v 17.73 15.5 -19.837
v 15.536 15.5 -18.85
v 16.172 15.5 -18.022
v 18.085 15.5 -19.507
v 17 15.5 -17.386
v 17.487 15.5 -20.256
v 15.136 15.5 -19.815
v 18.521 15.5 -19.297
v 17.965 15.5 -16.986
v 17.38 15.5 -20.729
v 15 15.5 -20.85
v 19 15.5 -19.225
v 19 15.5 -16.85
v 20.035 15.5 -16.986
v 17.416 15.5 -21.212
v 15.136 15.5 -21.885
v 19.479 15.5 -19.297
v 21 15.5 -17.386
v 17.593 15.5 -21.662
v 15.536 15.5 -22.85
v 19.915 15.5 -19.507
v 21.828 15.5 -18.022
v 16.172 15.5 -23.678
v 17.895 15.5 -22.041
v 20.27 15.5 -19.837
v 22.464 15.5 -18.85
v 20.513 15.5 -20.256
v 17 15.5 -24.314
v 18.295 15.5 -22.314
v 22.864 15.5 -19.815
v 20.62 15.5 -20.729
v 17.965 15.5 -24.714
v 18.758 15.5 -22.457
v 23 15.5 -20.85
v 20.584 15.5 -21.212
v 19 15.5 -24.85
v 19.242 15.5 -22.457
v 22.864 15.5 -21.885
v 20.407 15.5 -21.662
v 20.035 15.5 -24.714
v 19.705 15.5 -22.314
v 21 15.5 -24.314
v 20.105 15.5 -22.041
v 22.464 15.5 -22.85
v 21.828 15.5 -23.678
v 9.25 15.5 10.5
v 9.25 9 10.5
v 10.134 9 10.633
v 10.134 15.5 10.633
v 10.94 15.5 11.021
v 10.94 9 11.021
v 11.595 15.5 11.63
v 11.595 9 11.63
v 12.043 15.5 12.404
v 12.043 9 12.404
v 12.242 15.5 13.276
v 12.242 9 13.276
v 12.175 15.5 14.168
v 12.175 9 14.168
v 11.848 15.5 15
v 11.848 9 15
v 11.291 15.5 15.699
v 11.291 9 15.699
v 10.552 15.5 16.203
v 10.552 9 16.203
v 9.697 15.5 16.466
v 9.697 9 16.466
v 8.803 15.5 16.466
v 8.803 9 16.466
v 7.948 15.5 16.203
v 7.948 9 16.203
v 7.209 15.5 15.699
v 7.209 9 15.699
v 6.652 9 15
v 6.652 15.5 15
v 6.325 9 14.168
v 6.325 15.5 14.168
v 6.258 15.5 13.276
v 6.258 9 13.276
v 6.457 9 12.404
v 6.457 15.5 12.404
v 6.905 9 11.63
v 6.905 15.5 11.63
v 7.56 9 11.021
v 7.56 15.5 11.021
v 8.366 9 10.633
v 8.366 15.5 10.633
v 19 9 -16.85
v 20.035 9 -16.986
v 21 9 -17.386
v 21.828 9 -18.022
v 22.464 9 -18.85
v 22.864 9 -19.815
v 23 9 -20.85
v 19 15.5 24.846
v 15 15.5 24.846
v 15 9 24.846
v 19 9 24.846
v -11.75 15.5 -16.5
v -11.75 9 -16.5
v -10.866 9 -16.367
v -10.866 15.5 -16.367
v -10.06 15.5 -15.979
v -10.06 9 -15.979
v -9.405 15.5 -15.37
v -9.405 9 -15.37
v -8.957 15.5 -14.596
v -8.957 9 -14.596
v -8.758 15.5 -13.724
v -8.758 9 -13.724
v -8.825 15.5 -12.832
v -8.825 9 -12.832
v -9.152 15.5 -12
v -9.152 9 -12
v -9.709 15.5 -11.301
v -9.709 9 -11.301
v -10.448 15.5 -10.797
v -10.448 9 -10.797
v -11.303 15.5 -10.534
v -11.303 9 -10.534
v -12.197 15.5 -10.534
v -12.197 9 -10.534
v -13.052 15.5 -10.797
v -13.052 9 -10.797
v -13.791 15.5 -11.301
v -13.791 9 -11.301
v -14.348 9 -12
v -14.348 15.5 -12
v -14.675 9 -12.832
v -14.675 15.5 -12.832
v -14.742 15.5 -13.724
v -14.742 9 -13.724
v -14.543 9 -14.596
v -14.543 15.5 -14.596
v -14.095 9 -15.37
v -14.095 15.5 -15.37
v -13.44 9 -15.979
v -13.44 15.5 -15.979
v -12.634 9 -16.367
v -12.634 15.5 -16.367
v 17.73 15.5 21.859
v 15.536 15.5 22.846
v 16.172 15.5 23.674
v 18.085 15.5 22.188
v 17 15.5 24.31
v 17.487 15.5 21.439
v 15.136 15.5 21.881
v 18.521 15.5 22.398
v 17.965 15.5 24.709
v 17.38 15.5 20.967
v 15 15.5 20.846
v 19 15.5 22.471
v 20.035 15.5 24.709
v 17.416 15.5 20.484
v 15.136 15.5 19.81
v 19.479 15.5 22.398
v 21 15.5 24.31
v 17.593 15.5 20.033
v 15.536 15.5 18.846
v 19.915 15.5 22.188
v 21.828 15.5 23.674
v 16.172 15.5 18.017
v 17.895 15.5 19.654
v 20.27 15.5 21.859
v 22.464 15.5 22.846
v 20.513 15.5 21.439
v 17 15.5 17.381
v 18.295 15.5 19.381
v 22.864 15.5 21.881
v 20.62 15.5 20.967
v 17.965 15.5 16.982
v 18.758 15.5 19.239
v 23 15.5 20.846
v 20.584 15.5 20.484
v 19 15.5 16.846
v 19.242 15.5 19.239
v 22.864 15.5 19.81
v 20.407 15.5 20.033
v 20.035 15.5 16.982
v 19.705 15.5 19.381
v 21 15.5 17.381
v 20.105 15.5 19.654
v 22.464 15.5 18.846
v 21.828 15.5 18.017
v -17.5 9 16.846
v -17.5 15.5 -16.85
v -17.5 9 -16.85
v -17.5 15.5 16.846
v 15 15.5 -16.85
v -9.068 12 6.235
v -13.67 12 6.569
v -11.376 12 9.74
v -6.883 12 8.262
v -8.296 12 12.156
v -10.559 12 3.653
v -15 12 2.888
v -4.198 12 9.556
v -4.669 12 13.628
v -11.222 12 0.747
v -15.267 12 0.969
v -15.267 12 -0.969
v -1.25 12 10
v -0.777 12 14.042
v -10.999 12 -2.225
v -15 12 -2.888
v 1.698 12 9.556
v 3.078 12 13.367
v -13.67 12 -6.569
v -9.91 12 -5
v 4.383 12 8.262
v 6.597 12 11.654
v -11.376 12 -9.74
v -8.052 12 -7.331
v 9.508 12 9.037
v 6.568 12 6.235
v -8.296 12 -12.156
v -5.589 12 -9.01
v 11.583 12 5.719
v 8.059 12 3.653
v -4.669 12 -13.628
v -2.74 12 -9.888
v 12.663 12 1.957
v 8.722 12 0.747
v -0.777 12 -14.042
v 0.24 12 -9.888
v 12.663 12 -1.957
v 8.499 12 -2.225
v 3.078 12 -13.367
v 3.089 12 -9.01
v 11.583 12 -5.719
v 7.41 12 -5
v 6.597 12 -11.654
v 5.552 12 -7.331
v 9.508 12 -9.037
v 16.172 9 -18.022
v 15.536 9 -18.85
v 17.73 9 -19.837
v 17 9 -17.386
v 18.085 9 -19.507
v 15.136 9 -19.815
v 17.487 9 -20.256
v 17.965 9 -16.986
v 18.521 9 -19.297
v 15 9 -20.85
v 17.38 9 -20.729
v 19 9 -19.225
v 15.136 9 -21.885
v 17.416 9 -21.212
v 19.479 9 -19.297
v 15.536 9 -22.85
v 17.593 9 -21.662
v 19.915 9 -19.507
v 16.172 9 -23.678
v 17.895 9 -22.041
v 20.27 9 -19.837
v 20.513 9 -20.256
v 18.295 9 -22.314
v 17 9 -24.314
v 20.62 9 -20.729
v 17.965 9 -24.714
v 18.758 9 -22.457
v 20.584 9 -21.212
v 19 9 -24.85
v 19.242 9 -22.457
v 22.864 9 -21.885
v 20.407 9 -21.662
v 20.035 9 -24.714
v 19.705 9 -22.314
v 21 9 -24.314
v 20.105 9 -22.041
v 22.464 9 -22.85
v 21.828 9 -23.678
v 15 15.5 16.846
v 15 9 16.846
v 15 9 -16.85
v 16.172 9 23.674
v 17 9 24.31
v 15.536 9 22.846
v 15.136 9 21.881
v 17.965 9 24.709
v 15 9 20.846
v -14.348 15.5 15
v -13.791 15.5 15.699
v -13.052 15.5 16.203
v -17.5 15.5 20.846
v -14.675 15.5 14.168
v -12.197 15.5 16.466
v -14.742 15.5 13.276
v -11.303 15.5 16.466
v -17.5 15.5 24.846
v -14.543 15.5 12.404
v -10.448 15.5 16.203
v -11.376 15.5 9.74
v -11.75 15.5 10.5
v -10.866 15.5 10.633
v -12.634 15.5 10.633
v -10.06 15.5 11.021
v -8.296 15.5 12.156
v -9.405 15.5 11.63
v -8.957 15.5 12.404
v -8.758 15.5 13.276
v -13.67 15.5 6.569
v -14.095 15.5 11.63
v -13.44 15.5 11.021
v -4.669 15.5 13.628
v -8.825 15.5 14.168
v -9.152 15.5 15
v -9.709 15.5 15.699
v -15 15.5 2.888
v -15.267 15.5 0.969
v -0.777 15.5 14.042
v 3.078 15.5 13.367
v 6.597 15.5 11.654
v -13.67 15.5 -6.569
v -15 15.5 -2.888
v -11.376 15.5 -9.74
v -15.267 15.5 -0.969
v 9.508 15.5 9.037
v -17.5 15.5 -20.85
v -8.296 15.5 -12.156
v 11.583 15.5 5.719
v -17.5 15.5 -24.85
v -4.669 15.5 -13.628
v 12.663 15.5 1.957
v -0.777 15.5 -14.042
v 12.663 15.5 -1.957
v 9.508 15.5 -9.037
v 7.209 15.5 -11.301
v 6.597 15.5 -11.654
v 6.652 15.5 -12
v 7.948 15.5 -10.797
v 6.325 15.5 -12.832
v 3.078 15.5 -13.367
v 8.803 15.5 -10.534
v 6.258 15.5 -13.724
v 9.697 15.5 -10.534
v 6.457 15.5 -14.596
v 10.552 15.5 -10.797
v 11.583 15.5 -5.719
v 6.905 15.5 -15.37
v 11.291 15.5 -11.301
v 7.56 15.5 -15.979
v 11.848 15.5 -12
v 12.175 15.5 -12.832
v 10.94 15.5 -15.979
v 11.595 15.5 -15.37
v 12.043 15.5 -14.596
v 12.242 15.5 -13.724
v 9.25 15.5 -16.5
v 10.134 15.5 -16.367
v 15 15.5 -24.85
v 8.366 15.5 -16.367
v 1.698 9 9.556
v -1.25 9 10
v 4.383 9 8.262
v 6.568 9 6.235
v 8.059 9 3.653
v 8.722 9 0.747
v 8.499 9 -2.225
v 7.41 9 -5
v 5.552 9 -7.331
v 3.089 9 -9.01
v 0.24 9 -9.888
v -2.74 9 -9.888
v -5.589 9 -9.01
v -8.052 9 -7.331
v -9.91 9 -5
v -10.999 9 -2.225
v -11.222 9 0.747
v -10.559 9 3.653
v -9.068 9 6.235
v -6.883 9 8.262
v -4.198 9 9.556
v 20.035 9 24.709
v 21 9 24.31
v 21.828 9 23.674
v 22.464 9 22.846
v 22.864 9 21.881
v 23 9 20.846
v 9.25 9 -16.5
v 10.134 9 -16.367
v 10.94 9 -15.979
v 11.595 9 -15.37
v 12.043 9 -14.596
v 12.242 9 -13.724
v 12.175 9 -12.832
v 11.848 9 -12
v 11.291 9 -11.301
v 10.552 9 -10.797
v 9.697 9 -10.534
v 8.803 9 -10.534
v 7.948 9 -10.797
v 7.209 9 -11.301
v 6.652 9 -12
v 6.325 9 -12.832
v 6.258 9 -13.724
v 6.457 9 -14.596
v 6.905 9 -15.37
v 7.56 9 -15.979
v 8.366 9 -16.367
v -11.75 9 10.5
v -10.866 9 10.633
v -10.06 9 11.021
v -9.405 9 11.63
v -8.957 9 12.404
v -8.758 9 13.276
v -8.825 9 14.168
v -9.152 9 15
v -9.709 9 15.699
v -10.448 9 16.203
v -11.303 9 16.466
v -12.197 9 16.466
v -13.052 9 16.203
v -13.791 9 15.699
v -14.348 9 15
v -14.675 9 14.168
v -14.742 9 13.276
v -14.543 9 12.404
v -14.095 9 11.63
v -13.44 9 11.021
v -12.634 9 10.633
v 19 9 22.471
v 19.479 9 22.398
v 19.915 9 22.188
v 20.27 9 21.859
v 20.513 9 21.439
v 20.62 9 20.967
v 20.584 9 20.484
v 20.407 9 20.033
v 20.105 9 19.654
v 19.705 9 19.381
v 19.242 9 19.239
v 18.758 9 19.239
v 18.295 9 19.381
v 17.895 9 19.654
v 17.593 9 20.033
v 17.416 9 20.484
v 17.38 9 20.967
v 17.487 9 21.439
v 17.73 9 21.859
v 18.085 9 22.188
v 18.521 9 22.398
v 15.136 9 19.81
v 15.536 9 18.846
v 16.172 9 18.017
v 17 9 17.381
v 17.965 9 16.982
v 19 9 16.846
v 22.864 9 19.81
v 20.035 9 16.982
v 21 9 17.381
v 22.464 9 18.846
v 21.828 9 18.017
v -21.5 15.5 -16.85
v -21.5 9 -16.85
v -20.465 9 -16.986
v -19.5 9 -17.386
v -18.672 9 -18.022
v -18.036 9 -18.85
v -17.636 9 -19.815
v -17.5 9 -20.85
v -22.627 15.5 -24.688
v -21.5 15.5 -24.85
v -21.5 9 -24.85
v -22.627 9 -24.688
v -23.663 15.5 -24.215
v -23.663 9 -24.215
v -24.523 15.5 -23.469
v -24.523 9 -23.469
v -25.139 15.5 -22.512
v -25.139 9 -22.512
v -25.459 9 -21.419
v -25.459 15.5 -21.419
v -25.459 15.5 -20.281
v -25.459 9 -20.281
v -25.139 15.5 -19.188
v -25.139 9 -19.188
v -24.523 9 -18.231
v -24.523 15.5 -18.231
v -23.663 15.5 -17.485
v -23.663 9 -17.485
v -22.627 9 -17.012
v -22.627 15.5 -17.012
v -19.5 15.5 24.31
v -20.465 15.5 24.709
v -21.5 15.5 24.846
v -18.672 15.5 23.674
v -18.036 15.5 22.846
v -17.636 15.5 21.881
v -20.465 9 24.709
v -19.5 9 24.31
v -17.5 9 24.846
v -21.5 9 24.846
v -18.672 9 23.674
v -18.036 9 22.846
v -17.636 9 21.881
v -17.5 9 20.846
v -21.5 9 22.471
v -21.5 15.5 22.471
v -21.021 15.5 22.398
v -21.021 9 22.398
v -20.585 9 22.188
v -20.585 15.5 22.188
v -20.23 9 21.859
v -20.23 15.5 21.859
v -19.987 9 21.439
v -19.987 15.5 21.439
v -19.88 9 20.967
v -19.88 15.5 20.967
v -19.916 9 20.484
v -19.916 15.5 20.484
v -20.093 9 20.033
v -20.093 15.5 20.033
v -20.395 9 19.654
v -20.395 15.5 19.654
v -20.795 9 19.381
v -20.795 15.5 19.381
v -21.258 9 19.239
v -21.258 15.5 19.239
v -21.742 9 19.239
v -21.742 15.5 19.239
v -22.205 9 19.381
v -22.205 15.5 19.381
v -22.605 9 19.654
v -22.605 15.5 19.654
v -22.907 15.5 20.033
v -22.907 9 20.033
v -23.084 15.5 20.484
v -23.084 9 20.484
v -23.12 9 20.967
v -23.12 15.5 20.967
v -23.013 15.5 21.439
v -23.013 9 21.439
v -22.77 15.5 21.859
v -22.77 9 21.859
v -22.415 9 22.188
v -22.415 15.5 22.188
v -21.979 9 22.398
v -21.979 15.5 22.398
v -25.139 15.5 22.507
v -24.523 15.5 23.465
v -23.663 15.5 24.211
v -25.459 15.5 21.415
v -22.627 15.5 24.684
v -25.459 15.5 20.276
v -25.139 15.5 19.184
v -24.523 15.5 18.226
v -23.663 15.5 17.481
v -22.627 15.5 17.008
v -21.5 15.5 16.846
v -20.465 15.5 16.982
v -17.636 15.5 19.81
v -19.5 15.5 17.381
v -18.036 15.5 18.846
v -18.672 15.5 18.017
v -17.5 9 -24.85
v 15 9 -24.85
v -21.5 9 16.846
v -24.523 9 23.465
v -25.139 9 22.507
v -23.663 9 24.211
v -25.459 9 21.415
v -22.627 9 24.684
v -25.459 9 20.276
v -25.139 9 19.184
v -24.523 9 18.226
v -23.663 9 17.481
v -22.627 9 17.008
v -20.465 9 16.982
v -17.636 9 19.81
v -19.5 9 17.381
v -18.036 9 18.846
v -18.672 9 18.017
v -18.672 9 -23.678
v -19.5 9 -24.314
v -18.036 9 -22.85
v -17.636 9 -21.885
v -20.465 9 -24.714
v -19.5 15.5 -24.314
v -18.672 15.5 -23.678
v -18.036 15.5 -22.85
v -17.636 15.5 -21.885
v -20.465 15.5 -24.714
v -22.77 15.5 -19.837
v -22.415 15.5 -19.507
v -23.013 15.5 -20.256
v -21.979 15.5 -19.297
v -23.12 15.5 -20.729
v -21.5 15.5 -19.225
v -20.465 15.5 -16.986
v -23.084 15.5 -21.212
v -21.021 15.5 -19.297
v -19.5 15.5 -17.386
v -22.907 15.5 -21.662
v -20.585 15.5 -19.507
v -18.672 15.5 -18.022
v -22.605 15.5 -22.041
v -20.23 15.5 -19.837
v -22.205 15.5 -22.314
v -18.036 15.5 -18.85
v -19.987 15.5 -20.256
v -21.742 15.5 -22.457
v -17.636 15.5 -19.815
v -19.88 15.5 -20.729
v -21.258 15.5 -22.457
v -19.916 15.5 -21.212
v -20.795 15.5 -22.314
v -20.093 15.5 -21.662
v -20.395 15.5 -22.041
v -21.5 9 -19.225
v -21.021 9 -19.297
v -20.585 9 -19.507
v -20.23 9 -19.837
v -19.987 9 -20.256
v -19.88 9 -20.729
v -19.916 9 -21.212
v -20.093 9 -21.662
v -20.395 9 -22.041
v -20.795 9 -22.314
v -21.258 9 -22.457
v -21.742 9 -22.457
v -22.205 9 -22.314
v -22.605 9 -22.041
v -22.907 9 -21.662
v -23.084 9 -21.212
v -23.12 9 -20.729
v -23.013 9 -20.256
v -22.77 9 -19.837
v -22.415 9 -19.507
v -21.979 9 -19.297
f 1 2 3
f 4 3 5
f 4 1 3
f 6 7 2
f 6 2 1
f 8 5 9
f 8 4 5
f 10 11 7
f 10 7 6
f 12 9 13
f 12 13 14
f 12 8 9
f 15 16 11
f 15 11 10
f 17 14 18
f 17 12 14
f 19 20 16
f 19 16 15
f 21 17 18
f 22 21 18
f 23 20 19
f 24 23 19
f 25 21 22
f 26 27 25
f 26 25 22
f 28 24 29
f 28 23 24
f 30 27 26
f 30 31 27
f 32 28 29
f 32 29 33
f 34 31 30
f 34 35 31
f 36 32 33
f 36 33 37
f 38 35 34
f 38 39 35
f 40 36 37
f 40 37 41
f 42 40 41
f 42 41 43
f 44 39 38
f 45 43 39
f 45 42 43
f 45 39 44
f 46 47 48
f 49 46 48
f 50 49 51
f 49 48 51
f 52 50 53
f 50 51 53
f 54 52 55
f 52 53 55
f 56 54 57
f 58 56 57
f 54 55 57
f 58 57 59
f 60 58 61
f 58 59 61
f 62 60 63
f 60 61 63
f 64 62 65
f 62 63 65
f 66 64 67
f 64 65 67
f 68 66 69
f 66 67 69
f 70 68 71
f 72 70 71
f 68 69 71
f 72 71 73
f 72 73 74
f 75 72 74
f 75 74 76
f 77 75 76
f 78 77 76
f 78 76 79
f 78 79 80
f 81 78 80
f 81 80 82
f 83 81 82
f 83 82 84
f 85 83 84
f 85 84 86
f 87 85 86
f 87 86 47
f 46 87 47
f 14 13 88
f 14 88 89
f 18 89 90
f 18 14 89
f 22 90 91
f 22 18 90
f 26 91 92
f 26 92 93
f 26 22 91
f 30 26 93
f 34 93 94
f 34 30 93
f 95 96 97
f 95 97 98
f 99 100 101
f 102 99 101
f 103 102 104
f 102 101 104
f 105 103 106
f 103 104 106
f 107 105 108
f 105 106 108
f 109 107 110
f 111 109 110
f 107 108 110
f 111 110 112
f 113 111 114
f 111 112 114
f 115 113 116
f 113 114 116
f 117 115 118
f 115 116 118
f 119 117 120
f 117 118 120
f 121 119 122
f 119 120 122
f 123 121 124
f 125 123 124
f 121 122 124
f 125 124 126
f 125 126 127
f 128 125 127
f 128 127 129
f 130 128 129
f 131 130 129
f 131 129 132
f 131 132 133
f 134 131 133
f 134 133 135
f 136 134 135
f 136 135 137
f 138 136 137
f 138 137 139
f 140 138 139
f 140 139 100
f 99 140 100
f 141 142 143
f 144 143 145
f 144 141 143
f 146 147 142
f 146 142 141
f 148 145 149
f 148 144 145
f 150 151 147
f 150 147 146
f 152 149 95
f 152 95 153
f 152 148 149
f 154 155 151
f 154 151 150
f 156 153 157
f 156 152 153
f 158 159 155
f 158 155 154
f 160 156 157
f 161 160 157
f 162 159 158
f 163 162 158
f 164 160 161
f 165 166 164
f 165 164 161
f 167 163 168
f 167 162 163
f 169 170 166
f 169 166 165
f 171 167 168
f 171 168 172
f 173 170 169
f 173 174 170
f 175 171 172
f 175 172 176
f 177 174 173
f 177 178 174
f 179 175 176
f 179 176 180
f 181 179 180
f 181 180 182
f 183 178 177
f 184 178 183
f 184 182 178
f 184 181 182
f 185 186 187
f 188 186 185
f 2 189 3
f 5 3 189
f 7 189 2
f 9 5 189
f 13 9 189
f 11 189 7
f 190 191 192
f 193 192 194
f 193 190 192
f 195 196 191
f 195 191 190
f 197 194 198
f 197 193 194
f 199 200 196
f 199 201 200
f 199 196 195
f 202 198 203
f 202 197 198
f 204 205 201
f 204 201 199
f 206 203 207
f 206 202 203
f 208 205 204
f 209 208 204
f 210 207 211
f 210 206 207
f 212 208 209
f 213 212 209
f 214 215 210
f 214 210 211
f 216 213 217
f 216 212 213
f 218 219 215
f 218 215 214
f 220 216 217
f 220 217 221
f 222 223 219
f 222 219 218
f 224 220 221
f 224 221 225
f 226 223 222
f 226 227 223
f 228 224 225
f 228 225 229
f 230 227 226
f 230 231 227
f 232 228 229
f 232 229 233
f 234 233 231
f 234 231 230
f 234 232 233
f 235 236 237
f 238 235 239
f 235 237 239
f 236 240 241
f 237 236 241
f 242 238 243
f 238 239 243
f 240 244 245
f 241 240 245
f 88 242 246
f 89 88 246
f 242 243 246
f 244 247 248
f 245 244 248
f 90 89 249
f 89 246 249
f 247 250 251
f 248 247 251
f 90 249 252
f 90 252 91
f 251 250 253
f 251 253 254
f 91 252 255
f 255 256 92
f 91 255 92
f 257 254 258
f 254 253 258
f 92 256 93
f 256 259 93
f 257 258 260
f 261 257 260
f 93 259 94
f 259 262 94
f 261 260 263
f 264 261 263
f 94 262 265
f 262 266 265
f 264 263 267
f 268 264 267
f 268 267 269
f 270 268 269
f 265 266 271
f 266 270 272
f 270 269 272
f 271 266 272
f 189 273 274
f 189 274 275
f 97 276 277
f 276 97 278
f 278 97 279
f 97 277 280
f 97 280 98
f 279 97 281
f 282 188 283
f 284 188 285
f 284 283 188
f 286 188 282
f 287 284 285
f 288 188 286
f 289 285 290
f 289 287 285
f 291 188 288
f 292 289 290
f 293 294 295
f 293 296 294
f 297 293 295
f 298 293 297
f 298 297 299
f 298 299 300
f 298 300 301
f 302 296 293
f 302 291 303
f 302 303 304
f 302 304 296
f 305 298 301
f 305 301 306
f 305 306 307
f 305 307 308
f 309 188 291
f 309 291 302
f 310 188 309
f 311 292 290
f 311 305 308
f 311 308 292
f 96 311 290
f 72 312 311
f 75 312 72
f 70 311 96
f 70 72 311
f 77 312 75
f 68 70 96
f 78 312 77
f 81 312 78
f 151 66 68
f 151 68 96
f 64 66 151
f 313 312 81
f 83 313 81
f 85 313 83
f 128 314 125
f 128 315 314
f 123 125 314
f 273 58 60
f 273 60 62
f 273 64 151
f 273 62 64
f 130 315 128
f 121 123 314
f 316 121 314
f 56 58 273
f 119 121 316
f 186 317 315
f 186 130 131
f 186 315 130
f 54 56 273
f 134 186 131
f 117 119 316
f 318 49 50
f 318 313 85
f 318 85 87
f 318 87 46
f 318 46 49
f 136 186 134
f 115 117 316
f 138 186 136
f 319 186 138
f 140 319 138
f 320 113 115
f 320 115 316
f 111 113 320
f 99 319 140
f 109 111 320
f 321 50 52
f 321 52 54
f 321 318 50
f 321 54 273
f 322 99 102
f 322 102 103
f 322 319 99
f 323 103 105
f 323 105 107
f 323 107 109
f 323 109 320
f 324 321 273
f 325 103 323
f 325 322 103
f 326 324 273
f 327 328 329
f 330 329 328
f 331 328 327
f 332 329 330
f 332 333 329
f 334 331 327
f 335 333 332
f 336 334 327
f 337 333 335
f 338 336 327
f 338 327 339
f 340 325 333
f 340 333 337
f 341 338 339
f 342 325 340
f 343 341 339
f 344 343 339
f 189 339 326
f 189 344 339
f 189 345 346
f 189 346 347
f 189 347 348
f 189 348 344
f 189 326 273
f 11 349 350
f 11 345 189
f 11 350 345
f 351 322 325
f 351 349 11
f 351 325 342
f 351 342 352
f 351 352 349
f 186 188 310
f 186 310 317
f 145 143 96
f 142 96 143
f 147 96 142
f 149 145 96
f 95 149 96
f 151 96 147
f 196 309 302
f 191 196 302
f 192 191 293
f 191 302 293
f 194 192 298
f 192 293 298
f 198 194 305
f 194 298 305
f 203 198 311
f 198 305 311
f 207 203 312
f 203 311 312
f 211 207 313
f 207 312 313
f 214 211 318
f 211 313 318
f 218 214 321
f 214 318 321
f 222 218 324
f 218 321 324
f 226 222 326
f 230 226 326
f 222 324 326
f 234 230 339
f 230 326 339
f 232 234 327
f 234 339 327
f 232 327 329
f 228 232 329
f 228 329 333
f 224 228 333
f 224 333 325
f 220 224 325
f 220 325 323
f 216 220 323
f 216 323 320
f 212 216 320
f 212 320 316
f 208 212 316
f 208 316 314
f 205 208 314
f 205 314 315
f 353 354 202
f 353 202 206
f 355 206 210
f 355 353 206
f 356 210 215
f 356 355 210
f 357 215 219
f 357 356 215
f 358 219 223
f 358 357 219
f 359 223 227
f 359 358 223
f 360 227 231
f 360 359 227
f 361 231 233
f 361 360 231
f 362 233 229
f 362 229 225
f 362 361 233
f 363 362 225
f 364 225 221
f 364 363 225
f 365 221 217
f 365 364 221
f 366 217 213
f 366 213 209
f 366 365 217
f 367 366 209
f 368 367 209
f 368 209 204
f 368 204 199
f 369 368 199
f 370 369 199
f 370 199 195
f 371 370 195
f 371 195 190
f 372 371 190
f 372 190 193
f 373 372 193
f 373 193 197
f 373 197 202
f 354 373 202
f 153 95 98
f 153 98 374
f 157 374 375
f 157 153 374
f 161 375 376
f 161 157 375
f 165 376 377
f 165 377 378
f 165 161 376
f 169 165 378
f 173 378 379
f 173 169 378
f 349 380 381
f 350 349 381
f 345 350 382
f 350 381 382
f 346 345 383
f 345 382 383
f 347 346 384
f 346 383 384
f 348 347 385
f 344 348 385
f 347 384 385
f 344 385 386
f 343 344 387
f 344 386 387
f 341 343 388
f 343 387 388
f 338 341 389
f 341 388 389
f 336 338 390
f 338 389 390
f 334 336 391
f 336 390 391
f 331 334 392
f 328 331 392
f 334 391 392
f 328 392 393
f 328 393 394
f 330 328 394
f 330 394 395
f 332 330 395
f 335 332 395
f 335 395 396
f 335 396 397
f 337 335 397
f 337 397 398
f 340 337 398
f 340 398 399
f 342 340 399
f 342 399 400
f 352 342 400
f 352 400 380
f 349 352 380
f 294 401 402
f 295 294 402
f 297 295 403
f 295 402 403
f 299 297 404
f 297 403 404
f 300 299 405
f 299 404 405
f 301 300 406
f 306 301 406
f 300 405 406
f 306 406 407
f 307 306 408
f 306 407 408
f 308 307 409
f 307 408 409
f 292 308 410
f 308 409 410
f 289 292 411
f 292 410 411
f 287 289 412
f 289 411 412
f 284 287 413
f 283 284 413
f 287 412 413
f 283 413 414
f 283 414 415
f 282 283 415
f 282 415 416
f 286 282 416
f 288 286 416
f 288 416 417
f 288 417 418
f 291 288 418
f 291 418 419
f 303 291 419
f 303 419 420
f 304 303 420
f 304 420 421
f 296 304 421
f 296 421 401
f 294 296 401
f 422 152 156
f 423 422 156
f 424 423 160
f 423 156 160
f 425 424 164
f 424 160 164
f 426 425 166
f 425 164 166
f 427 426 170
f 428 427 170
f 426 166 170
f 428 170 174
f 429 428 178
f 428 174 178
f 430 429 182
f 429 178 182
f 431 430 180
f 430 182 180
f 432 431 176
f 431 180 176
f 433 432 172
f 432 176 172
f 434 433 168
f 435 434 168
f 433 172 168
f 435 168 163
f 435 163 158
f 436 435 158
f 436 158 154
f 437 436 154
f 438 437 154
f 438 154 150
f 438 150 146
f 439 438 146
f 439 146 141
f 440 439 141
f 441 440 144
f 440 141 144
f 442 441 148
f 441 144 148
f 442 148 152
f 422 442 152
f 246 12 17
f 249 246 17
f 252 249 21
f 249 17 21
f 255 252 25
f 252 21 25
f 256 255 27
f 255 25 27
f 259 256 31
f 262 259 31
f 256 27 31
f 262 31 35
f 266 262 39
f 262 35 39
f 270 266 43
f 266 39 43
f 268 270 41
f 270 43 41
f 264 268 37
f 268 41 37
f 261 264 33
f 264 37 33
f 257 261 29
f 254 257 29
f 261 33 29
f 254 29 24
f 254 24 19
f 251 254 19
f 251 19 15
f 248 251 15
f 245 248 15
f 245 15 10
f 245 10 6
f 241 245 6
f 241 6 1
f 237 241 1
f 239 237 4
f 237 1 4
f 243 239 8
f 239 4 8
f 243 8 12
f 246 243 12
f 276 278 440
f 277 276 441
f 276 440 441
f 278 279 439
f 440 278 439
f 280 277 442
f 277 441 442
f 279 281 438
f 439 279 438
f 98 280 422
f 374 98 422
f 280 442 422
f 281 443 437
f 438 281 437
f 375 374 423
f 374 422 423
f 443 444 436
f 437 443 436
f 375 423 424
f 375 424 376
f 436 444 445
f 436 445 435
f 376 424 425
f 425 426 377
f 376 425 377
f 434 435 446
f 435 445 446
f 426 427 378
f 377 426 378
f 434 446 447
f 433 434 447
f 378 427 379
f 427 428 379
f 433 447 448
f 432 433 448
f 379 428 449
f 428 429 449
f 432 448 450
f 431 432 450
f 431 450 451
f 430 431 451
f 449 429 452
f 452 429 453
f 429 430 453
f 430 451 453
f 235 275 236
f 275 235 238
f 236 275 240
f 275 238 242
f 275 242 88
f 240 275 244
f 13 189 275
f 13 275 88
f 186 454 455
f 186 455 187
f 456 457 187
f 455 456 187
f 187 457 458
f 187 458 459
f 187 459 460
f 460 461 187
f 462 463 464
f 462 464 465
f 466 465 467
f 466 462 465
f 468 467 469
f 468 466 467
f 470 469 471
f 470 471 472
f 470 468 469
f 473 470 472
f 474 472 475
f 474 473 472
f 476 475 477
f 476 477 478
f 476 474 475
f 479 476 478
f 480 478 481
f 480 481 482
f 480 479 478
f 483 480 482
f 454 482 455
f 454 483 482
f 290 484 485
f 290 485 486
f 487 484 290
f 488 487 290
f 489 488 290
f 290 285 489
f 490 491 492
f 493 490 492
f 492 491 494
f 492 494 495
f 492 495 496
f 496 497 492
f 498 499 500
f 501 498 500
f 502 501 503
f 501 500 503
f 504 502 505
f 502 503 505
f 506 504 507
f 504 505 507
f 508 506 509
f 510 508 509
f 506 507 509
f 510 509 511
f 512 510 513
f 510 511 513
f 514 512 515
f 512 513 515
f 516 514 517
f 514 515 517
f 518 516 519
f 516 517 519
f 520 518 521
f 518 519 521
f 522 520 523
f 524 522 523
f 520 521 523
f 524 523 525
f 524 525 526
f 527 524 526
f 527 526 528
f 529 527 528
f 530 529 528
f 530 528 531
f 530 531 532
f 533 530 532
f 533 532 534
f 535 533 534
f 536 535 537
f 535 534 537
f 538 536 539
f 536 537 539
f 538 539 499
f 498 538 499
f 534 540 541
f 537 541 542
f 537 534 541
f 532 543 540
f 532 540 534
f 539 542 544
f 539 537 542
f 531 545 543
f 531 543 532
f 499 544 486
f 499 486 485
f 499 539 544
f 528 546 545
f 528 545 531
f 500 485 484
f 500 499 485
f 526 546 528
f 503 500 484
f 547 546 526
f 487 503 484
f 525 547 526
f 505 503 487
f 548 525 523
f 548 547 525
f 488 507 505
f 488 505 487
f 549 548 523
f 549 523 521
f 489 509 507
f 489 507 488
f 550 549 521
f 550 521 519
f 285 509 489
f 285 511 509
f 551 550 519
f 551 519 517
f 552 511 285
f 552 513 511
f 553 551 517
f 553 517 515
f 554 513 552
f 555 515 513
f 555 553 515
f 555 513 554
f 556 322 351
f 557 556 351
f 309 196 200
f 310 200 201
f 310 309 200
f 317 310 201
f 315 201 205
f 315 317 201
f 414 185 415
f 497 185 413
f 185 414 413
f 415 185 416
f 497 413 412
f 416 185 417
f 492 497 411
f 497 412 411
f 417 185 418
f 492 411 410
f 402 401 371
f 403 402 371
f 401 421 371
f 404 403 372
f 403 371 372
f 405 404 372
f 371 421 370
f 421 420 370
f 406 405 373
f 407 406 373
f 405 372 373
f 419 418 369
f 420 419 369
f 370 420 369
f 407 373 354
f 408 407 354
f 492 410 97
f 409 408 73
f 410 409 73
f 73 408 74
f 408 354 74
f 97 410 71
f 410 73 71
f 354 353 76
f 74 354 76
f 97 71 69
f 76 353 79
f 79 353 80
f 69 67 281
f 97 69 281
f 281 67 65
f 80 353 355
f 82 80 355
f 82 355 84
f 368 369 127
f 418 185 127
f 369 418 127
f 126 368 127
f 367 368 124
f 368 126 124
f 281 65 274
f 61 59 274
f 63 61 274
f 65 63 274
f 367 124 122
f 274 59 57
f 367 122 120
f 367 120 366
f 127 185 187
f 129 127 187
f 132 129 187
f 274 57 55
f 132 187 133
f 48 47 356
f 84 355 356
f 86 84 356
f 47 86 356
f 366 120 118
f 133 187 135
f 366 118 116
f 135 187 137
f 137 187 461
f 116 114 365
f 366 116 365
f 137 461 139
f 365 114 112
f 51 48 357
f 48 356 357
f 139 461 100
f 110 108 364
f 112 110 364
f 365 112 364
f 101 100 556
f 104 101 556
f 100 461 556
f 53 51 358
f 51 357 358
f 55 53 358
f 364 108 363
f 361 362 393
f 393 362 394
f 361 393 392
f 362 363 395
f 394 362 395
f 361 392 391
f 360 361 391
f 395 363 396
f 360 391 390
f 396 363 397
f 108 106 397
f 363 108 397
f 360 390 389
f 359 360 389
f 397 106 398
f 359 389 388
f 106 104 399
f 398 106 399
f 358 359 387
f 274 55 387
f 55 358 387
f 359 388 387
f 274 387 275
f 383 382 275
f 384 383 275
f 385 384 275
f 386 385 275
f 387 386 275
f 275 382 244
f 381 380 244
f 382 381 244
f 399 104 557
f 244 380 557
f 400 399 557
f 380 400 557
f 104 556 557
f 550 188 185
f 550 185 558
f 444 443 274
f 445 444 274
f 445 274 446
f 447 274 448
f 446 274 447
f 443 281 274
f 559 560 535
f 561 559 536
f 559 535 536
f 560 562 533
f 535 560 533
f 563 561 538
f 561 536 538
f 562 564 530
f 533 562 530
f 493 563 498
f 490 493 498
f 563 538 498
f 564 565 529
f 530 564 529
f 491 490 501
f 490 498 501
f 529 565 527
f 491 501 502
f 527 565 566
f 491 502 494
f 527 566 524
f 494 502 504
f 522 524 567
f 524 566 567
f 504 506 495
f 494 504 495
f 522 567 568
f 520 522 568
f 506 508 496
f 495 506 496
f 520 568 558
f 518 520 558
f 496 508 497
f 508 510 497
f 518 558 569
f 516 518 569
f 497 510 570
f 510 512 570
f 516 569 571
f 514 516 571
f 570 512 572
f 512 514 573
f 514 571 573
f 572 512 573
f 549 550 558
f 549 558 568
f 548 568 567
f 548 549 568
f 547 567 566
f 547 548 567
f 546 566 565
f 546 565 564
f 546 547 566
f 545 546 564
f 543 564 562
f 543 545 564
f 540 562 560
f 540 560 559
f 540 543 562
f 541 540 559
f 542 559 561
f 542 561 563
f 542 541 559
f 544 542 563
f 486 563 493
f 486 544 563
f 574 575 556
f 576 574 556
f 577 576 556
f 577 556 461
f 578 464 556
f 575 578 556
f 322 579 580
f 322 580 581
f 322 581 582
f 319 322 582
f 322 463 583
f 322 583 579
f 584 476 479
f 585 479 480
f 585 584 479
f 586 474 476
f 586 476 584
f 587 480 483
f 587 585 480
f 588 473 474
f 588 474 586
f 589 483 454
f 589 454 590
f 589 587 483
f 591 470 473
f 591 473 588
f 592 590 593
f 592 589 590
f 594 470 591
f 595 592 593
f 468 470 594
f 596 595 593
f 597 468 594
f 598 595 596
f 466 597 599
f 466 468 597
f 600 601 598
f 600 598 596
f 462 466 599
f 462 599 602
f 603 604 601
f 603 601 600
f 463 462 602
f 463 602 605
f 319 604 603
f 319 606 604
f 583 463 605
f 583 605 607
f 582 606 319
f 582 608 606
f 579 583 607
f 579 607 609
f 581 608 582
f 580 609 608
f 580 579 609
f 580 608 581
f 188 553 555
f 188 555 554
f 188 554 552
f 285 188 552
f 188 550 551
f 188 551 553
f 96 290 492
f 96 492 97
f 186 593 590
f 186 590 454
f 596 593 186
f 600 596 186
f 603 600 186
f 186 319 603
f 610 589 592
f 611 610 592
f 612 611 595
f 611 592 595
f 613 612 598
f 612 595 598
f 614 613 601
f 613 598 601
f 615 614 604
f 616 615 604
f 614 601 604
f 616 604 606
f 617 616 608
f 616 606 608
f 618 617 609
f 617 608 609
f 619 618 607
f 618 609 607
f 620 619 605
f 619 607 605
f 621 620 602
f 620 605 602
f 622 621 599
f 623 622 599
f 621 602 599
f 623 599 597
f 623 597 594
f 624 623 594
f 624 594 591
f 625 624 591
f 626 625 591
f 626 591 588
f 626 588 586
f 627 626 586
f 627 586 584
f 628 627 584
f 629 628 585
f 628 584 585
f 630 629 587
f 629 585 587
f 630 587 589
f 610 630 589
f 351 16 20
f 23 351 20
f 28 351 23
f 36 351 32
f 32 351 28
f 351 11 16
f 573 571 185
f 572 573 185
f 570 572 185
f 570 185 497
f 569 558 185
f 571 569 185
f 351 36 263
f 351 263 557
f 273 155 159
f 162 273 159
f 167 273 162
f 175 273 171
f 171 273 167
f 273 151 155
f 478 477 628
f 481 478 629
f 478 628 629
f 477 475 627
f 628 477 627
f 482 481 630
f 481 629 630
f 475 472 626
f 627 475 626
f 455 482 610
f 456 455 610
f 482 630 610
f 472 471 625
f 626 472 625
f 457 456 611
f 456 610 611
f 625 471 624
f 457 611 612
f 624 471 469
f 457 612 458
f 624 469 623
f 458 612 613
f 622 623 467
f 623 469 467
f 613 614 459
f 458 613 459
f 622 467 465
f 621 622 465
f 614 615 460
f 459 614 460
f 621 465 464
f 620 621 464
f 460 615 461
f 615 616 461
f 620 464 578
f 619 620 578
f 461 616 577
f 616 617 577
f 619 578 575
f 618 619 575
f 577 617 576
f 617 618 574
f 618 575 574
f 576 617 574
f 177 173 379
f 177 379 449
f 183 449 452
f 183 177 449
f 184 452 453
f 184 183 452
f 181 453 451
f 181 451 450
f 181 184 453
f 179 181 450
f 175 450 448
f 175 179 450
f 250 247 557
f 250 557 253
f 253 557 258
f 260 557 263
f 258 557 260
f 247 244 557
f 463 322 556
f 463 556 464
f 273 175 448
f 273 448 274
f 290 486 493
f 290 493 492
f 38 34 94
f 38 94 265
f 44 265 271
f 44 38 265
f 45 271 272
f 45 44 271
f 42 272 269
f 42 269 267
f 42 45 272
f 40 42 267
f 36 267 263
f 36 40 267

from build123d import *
from build123d.topology import SkipClean

# Parameters (mm, degrees)
SKETCH1_R            = 1.375
SKETCH1_R_2          = 1.460845326
SKETCH1_R_3          = 1.480655282
BOSS_EXTRUDE1_DEPTH  = 15
BOSS_EXTRUDE2_START  = -8
SKETCH2_R            = 14
SKETCH2_R_2          = 10
BOSS_EXTRUDE2_DEPTH  = 8
CUT_EXTRUDE1_START   = -3
SKETCH3_R            = 14
SKETCH3_R_2          = 10
CUT_EXTRUDE1_DEPTH   = 3
SKETCH5_R            = 1.480655282
SKETCH5_R_2          = 1.375
SKETCH5_R_3          = 1.460845326
BOSS_EXTRUDE3_DEPTH  = 0.5
SKETCH6_W            = 32.415484222
SKETCH6_H            = 34.71462202
CUT_EXTRUDE2_DEPTH   = 7
SKETCH7_W            = 33.435139342
SKETCH7_H            = 35.82697306
CUT_EXTRUDE3_DEPTH   = 2
BOSS_EXTRUDE4_DEPTH  = 6.5
SKETCH9_R            = 3.5
SKETCH9_R_2          = 1.625
CUT_EXTRUDE4_DEPTH   = 3
SKETCH10_R           = 3
CUT_EXTRUDE5_DEPTH   = 28
SKETCH11_R           = 14.05
CUT_EXTRUDE6_DEPTH   = 3.5
SKETCH12_W           = 30
SKETCH12_H           = 8
SKETCH12_H_2         = 7.99555269
BOSS_EXTRUDE5_DEPTH  = 6.5
BOSS_EXTRUDE8_DEPTH  = 6.5
BOSS_EXTRUDE9_START  = -3
SKETCH15_R           = 14.05
SKETCH15_R_2         = 14
BOSS_EXTRUDE9_DEPTH  = 3
SKETCH16_R           = 4
SKETCH16_R_2         = 1.625
BOSS_EXTRUDE10_DEPTH = 6.5


with BuildPart() as part:
    # Sketch1 → Boss-Extrude1 (new body)
    with BuildSketch(Plane(origin=(0, 0, 0), x_dir=(1, 0, 0), z_dir=(0, 1, 0))):
        with BuildLine():
            Line((-15, -16.85), (15, -16.85))
            Line((15, -16.85), (15, 16.85))
            Line((15, 16.85), (-15, 16.85))
            Line((-15, 16.85), (-15, 2.633913438))
            ThreePointArc((-15, 2.633913438), (0.072875656, 13.937359865), (12.75, 0))
            ThreePointArc((12.75, 0), (0.072875656, -13.937359865), (-15, -2.633913438))
            Line((-15, -2.633913438), (-15, -16.85))
        make_face()
        with Locations(Location((-11.75, -13.5, 0), (0, 0, 270))):
            Circle(SKETCH1_R, mode=Mode.SUBTRACT)
        with Locations(Location((9.25, -13.5, 0), (0, 0, 270))):
            Circle(SKETCH1_R_2, mode=Mode.SUBTRACT)
        with Locations(Location((-11.75, 13.5, 0), (0, 0, 270))):
            Circle(SKETCH1_R, mode=Mode.SUBTRACT)
        with Locations(Location((9.25, 13.5, 0), (0, 0, 270))):
            Circle(SKETCH1_R_3, mode=Mode.SUBTRACT)
    extrude(amount=BOSS_EXTRUDE1_DEPTH)

    # Sketch2 → Boss-Extrude2 (add)
    with BuildSketch(Plane(origin=(0, 15, 0), x_dir=(1, 0, 0), z_dir=(0, 1, 0)).offset(BOSS_EXTRUDE2_START)):
        with Locations((-1.25, 0)):
            Circle(SKETCH2_R)
        with Locations(Location((-1.25, 0, 0), (0, 0, 270))):
            Circle(SKETCH2_R_2, mode=Mode.SUBTRACT)
    extrude(amount=BOSS_EXTRUDE2_DEPTH)

    # Sketch3 → Cut-Extrude1 (cut)
    with BuildSketch(Plane(origin=(0, 15, 0), x_dir=(1, 0, 0), z_dir=(0, 1, 0)).offset(CUT_EXTRUDE1_START)):
        with Locations((-1.25, 0)):
            Circle(SKETCH3_R)
        with Locations(Location((-1.25, 0, 0), (0, 0, 270))):
            Circle(SKETCH3_R_2, mode=Mode.SUBTRACT)
    extrude(amount=CUT_EXTRUDE1_DEPTH, mode=Mode.SUBTRACT)

    # Sketch5 → Boss-Extrude3 (add)
    with BuildSketch(Plane(origin=(0, 15, 0), x_dir=(1, 0, 0), z_dir=(0, 1, 0))):
        with BuildLine():
            Line((-15, 16.85), (-15, 2.633913438))
            ThreePointArc((-15, 2.633913438), (12.75, 0), (-15, -2.633913438))
            Line((-15, -2.633913438), (-15, -16.85))
            Line((-15, -16.85), (15, -16.85))
            Line((15, -16.85), (15, 16.85))
            Line((15, 16.85), (-15, 16.85))
        make_face()
        with Locations(Location((9.25, 13.5, 0), (0, 0, 270))):
            Circle(SKETCH5_R, mode=Mode.SUBTRACT)
        with Locations(Location((-11.75, -13.5, 0), (0, 0, 270))):
            Circle(SKETCH5_R_2, mode=Mode.SUBTRACT)
        with Locations(Location((-11.75, 13.5, 0), (0, 0, 270))):
            Circle(SKETCH5_R_2, mode=Mode.SUBTRACT)
        with Locations(Location((9.25, -13.5, 0), (0, 0, 270))):
            Circle(SKETCH5_R_3, mode=Mode.SUBTRACT)
    extrude(amount=BOSS_EXTRUDE3_DEPTH)

    # Sketch6 → Cut-Extrude2 (cut)
    with BuildSketch(Plane.XZ):
        Rectangle(SKETCH6_W, SKETCH6_H)
    extrude(amount=-CUT_EXTRUDE2_DEPTH, mode=Mode.SUBTRACT)

    # Sketch7 → Cut-Extrude3 (cut)
    with BuildSketch(Plane.XZ.offset(-7)):
        Rectangle(SKETCH7_W, SKETCH7_H)
    extrude(amount=-CUT_EXTRUDE3_DEPTH, mode=Mode.SUBTRACT)

    # Sketch8 → Boss-Extrude4 (add)
    with BuildSketch(Plane.XZ.offset(-9)):
        with BuildLine():
            Line((3.5, 16.85), (3.5, 20.35))
            ThreePointArc((3.5, 20.35), (2.474873725, 17.875126257), (-2.6e-08, 16.85))
            Line((-2.6e-08, 16.85), (3.5, 16.85))
        make_face()
        with BuildLine():
            ThreePointArc((-2.6e-08, 16.85), (-2.474873743, 17.875126275), (-3.5, 20.35))
            Line((-3.5, 20.35), (-3.5, 16.85))
            Line((-3.5, 16.85), (-2.6e-08, 16.85))
        make_face()
        with BuildLine():
            ThreePointArc((-1.625, 20.35), (0, 21.975), (1.625, 20.35))
            Line((1.625, 20.35), (3.5, 20.35))
            ThreePointArc((3.5, 20.35), (0, 23.85), (-3.5, 20.35))
            Line((-3.5, 20.35), (-1.625, 20.35))
        make_face()
        with BuildLine():
            Line((3.5, 20.35), (1.625, 20.35))
            ThreePointArc((1.625, 20.35), (0, 18.725), (-1.625, 20.35))
            Line((-1.625, 20.35), (-3.5, 20.35))
            ThreePointArc((-3.5, 20.35), (-2.474873743, 17.875126275), (-2.6e-08, 16.85))
            ThreePointArc((-2.6e-08, 16.85), (2.474873725, 17.875126257), (3.5, 20.35))
        make_face()
        with BuildLine():
            Line((3.5, -20.35), (3.5, -16.85))
            Line((3.5, -16.85), (0, -16.85))
            ThreePointArc((0, -16.85), (2.474873734, -17.875126266), (3.5, -20.35))
        make_face()
        with BuildLine():
            ThreePointArc((-3.5, -20.35), (-2.474873734, -17.875126266), (0, -16.85))
            Line((0, -16.85), (-3.5, -16.85))
            Line((-3.5, -16.85), (-3.5, -20.35))
        make_face()
        with BuildLine():
            ThreePointArc((-3.5, -20.35), (0, -23.85), (3.5, -20.35))
            Line((3.5, -20.35), (1.625, -20.35))
            ThreePointArc((1.625, -20.35), (0, -21.975), (-1.625, -20.35))
            Line((-1.625, -20.35), (-3.5, -20.35))
        make_face()
        with BuildLine():
            Line((1.625, -20.35), (3.5, -20.35))
            ThreePointArc((3.5, -20.35), (2.474873734, -17.875126266), (0, -16.85))
            ThreePointArc((0, -16.85), (-2.474873734, -17.875126266), (-3.5, -20.35))
            Line((-3.5, -20.35), (-1.625, -20.35))
            ThreePointArc((-1.625, -20.35), (0, -18.725), (1.625, -20.35))
        make_face()
    extrude(amount=-BOSS_EXTRUDE4_DEPTH)

    # Sketch9 → Cut-Extrude4 (cut)
    # profile 1 of 2: a face of its own
    with BuildSketch(Plane.XZ.offset(-9)):
        with Locations((0, 20.35)):
            Circle(SKETCH9_R)
        with Locations(Location((0, 20.35, 0), (0, 0, 270))):
            Circle(SKETCH9_R_2, mode=Mode.SUBTRACT)
    # profile 2 of 2: a face of its own
    with BuildSketch(Plane.XZ.offset(-9)):
        with Locations((0, -20.35)):
            Circle(SKETCH9_R)
        with Locations(Location((0, -20.35, 0), (0, 0, 270))):
            Circle(SKETCH9_R_2, mode=Mode.SUBTRACT)
    extrude(amount=-CUT_EXTRUDE4_DEPTH, mode=Mode.SUBTRACT)

    # Sketch10 → Cut-Extrude5 (cut)
    with BuildSketch(Plane.XZ.offset(-9)):
        with Locations(Location((-11.75, 13.5, 0), (0, 0, 270))):
            Circle(SKETCH10_R)
        with Locations(Location((9.25, 13.5, 0), (0, 0, 270))):
            Circle(SKETCH10_R)
        with Locations(Location((9.25, -13.5, 0), (0, 0, 270))):
            Circle(SKETCH10_R)
        with Locations(Location((-11.75, -13.5, 0), (0, 0, 270))):
            Circle(SKETCH10_R)
    extrude(amount=-CUT_EXTRUDE5_DEPTH, mode=Mode.SUBTRACT)

    # Sketch11 → Cut-Extrude6 (cut)
    with BuildSketch(Plane(origin=(0, 15.5, 0), x_dir=(1, 0, 0), z_dir=(0, 1, 0))):
        with Locations((-1.25, 0)):
            Circle(SKETCH11_R)
    extrude(amount=-CUT_EXTRUDE6_DEPTH, mode=Mode.SUBTRACT)

    # Sketch12 → Boss-Extrude5 (add)
    with BuildSketch(Plane(origin=(0, 15.5, 0), x_dir=(1, 0, 0), z_dir=(0, 1, 0))):
        with Locations((0, 20.85)):
            Rectangle(SKETCH12_W, SKETCH12_H)
        with Locations((0, -20.847776345)):
            Rectangle(SKETCH12_W, SKETCH12_H_2)
    extrude(amount=-BOSS_EXTRUDE5_DEPTH)

    # Sketch13 → Boss-Extrude8 (add)
    with SkipClean():  # the faces are left unmerged after this step: merging them gives an invalid solid
        with BuildSketch(Plane(origin=(0, 15.5, 0), x_dir=(1, 0, 0), z_dir=(0, 1, 0))):
            with BuildLine():
                Line((-15, 2.887905816), (-15, 24.85))
                Line((-15, 24.85), (-17.5, 24.85))
                Line((-17.5, 24.85), (-17.5, -24.84555269))
                Line((-17.5, -24.84555269), (-15, -24.84555269))
                Line((-15, -24.84555269), (-15, -2.887905816))
                ThreePointArc((-15, -2.887905816), (-15.3, 0), (-15, 2.887905816))
            make_face()
        extrude(amount=-BOSS_EXTRUDE8_DEPTH)

    # Sketch15 → Boss-Extrude9 (add)
    with BuildSketch(Plane.XZ.offset(-9).offset(BOSS_EXTRUDE9_START)):
        with Locations(Location((-1.25, 0, 0), (0, 0, 90))):
            Circle(SKETCH15_R)
        with Locations((-1.25, 0)):
            Circle(SKETCH15_R_2, mode=Mode.SUBTRACT)
    extrude(amount=BOSS_EXTRUDE9_DEPTH)

    # Sketch16 → Boss-Extrude10 (add)
    # profile 1 of 12: a face of its own
    with SkipClean():  # the faces are left unmerged after this step: merging them gives an invalid solid
        with BuildSketch(Plane(origin=(0, 15.5, 0), x_dir=(1, 0, 0), z_dir=(0, 1, 0))):
            with BuildLine():
                Line((-17.5, 20.85), (-17.5, 24.85))
                Line((-17.5, 24.85), (-21.5, 24.85))
                ThreePointArc((-21.5, 24.85), (-18.671572875, 23.678427125), (-17.5, 20.85))
            make_face()
        # profile 2 of 12: a face of its own
        with BuildSketch(Plane(origin=(0, 15.5, 0), x_dir=(1, 0, 0), z_dir=(0, 1, 0))):
            with BuildLine():
                Line((-17.5, 16.85), (-17.5, 20.85))
                ThreePointArc((-17.5, 20.85), (-18.671572875, 18.021572875), (-21.5, 16.85))
                Line((-21.5, 16.85), (-17.5, 16.85))
            make_face()
        # profile 3 of 12: a face of its own
        with BuildSketch(Plane(origin=(0, 15.5, 0), x_dir=(1, 0, 0), z_dir=(0, 1, 0))):
            with Locations((-21.5, 20.85)):
                Circle(SKETCH16_R)
            with Locations(Location((-21.5, 20.85, 0), (0, 0, 270))):
                Circle(SKETCH16_R_2, mode=Mode.SUBTRACT)
        # profile 4 of 12: a face of its own
        with BuildSketch(Plane(origin=(0, 15.5, 0), x_dir=(1, 0, 0), z_dir=(0, 1, 0))):
            with Locations((19, 20.85)):
                Circle(SKETCH16_R)
            with Locations(Location((19, 20.85, 0), (0, 0, 270))):
                Circle(SKETCH16_R_2, mode=Mode.SUBTRACT)
        # profile 5 of 12: a face of its own
        with BuildSketch(Plane(origin=(0, 15.5, 0), x_dir=(1, 0, 0), z_dir=(0, 1, 0))):
            with BuildLine():
                ThreePointArc((19, 16.85), (16.171572875, 18.021572875), (15, 20.85))
                Line((15, 20.85), (15, 16.85))
                Line((15, 16.85), (19, 16.85))
            make_face()
        # profile 6 of 12: a face of its own
        with BuildSketch(Plane(origin=(0, 15.5, 0), x_dir=(1, 0, 0), z_dir=(0, 1, 0))):
            with BuildLine():
                Line((19, 24.85), (15, 24.85))
                Line((15, 24.85), (15, 20.85))
                ThreePointArc((15, 20.85), (16.171572875, 23.678427125), (19, 24.85))
            make_face()
        # profile 7 of 12: a face of its own
        with BuildSketch(Plane(origin=(0, 15.5, 0), x_dir=(1, 0, 0), z_dir=(0, 1, 0))):
            with BuildLine():
                Line((-17.5, -20.84555269), (-17.5, -16.84555269))
                Line((-17.5, -16.84555269), (-21.5, -16.84555269))
                ThreePointArc((-21.5, -16.84555269), (-18.671572875, -18.017125565), (-17.5, -20.84555269))
            make_face()
        # profile 8 of 12: a face of its own
        with BuildSketch(Plane(origin=(0, 15.5, 0), x_dir=(1, 0, 0), z_dir=(0, 1, 0))):
            with BuildLine():
                Line((-17.5, -24.84555269), (-17.5, -20.84555269))
                ThreePointArc((-17.5, -20.84555269), (-18.671572875, -23.673979815), (-21.5, -24.84555269))
                Line((-21.5, -24.84555269), (-17.5, -24.84555269))
            make_face()
        # profile 9 of 12: a face of its own
        with BuildSketch(Plane(origin=(0, 15.5, 0), x_dir=(1, 0, 0), z_dir=(0, 1, 0))):
            with Locations((-21.5, -20.84555269)):
                Circle(SKETCH16_R)
            with Locations(Location((-21.5, -20.84555269, 0), (0, 0, 270))):
                Circle(SKETCH16_R_2, mode=Mode.SUBTRACT)
        # profile 10 of 12: a face of its own
        with BuildSketch(Plane(origin=(0, 15.5, 0), x_dir=(1, 0, 0), z_dir=(0, 1, 0))):
            with BuildLine():
                Line((19, -16.84555269), (15, -16.84555269))
                Line((15, -16.84555269), (15, -20.84555269))
                ThreePointArc((15, -20.84555269), (16.171572875, -18.017125565), (19, -16.84555269))
            make_face()
        # profile 11 of 12: a face of its own
        with BuildSketch(Plane(origin=(0, 15.5, 0), x_dir=(1, 0, 0), z_dir=(0, 1, 0))):
            with BuildLine():
                ThreePointArc((19, -24.84555269), (16.171572875, -23.673979815), (15, -20.84555269))
                Line((15, -20.84555269), (15, -24.84555269))
                Line((15, -24.84555269), (19, -24.84555269))
            make_face()
        # profile 12 of 12: a face of its own
        with BuildSketch(Plane(origin=(0, 15.5, 0), x_dir=(1, 0, 0), z_dir=(0, 1, 0))):
            with Locations((19, -20.84555269)):
                Circle(SKETCH16_R)
            with Locations(Location((19, -20.84555269, 0), (0, 0, 270))):
                Circle(SKETCH16_R_2, mode=Mode.SUBTRACT)
        extrude(amount=-BOSS_EXTRUDE10_DEPTH)


solid = part.part
